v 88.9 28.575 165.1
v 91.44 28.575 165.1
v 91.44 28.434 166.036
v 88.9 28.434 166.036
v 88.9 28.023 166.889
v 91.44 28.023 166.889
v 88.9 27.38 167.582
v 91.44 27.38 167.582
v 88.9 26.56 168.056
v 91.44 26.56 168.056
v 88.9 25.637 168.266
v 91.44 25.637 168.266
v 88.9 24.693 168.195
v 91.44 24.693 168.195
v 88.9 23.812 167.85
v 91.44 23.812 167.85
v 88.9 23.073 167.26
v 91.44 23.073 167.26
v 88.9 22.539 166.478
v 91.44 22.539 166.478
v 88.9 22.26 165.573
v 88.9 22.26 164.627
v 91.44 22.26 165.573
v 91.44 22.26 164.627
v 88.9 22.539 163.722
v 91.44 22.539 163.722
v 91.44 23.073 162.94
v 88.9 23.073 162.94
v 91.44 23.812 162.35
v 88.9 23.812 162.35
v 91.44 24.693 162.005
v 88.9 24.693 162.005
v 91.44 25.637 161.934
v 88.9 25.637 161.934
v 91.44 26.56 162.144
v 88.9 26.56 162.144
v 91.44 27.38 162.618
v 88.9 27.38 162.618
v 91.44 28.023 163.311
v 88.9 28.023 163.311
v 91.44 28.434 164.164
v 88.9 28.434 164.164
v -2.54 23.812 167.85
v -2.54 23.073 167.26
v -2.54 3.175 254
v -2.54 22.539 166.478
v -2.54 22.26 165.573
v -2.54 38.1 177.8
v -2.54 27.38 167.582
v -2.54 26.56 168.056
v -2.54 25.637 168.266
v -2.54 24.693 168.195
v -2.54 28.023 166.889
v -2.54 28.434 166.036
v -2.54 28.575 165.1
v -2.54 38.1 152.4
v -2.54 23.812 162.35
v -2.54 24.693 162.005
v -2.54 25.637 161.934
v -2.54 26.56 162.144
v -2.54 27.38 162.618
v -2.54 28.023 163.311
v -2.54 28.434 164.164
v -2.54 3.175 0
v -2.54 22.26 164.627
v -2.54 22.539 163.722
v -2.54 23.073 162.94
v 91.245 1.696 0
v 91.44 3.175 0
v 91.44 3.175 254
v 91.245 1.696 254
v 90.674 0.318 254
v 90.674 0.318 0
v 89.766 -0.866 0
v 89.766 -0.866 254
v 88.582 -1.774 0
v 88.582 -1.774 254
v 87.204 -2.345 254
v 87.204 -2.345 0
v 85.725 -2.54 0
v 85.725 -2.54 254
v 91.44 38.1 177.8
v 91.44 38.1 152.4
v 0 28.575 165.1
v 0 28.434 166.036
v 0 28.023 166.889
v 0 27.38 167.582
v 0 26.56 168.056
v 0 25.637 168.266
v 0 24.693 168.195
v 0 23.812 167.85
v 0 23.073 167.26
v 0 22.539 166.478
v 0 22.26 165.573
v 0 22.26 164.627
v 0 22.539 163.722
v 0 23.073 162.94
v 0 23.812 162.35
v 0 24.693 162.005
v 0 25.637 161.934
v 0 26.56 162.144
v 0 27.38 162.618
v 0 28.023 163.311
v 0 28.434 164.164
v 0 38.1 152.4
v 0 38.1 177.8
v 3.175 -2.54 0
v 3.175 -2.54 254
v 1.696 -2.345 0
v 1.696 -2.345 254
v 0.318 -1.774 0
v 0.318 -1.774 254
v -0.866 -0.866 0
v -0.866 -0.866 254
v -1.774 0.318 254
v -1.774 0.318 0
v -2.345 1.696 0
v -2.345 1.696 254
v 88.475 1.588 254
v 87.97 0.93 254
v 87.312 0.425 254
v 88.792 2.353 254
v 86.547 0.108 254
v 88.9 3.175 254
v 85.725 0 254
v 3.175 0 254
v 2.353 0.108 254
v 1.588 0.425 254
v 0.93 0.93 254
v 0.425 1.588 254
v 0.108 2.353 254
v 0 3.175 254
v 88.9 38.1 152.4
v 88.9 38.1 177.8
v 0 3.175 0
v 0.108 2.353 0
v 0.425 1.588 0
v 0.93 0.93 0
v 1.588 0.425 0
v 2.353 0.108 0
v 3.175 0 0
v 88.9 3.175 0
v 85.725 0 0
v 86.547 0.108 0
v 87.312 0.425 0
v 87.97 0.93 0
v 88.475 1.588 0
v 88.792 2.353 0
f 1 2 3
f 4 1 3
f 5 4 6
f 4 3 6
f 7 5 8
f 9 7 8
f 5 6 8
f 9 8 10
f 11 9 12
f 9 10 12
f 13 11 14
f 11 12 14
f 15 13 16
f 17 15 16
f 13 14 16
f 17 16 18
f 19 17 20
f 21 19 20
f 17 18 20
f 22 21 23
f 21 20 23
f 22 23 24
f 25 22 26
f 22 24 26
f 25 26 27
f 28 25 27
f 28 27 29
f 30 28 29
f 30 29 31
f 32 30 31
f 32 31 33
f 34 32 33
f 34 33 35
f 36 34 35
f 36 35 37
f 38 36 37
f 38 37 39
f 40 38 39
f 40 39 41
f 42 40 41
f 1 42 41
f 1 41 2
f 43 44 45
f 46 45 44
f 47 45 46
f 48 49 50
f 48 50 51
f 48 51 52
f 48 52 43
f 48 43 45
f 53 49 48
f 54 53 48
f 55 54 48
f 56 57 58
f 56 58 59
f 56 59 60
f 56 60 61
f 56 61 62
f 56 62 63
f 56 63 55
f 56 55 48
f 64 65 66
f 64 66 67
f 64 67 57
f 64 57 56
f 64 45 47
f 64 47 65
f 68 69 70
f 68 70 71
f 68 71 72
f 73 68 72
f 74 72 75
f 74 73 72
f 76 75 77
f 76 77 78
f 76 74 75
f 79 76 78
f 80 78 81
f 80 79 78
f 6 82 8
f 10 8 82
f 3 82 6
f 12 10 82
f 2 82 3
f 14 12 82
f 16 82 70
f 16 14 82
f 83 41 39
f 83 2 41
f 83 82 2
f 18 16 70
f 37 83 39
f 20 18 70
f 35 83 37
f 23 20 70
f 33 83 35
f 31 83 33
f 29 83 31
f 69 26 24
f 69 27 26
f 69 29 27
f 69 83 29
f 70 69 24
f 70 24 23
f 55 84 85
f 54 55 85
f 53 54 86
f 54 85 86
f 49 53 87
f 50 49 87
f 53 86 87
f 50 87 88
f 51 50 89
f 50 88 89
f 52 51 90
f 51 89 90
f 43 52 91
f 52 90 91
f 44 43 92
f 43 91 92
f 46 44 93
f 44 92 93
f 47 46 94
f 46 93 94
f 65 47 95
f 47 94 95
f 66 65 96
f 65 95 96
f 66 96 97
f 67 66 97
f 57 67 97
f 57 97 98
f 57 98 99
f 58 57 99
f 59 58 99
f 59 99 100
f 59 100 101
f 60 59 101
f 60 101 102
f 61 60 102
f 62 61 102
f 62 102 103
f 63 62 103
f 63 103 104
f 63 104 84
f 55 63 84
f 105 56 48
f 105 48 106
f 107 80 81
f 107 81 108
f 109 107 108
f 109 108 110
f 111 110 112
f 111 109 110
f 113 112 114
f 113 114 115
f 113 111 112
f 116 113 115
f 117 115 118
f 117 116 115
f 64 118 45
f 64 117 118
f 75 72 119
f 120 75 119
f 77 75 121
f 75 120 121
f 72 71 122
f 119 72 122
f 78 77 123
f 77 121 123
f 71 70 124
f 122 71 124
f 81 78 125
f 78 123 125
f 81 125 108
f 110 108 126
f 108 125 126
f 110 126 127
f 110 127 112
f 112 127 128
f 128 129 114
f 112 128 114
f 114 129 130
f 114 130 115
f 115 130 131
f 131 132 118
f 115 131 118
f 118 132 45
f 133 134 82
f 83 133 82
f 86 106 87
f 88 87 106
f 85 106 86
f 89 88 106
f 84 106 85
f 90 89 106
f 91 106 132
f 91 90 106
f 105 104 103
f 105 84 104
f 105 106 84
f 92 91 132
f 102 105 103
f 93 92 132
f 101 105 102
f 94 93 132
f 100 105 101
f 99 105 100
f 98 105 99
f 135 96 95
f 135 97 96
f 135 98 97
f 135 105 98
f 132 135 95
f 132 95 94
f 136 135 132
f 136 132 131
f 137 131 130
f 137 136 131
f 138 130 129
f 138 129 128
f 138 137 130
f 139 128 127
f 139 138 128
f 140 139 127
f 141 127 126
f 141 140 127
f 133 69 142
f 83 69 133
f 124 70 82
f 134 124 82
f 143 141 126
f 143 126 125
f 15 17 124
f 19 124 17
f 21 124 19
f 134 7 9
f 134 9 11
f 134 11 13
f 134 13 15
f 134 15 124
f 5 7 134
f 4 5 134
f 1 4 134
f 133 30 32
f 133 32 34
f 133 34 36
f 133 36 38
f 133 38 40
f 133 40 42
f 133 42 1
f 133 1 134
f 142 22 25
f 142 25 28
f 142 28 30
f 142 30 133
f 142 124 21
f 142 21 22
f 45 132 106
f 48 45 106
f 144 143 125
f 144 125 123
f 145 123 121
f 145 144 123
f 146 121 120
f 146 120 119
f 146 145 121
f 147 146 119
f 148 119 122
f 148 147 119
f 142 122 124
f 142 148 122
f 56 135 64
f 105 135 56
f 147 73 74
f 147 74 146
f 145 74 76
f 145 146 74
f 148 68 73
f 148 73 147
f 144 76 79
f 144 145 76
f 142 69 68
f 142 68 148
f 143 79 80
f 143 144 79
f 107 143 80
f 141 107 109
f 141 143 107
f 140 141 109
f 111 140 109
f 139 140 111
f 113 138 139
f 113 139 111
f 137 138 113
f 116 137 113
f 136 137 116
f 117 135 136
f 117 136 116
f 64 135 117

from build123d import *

# Parameters (mm, degrees)
BASE_FLANGE1_DEPTH = 254
SKETCH7_R          = 3.175
CUT_EXTRUDE1_DEPTH = 274.495613128


# Sheet-metal steps are written as plain solids
with BuildPart() as part:
    # Sketch2 → Base-Flange1 (new body)
    with BuildSketch(Plane.XY):
        with BuildLine():
            Line((0, 38.1), (0, 3.175))
            ThreePointArc((0, 3.175), (0.92993597, 0.92993597), (3.175, 0))
            Line((3.175, 0), (85.725, 0))
            ThreePointArc((85.725, 0), (87.97006403, 0.92993597), (88.9, 3.175))
            Line((88.9, 3.175), (88.9, 38.1))
            Line((88.9, 38.1), (91.44, 38.1))
            Line((91.44, 38.1), (91.44, 3.175))
            ThreePointArc((91.44, 3.175), (89.766115254, -0.866115254), (85.725, -2.54))
            Line((85.725, -2.54), (3.175, -2.54))
            ThreePointArc((3.175, -2.54), (-0.866115254, -0.866115254), (-2.54, 3.175))
            Line((-2.54, 3.175), (-2.54, 38.1))
            Line((-2.54, 38.1), (0, 38.1))
        make_face()
    extrude(amount=BASE_FLANGE1_DEPTH)

    # Sketch7 → Cut-Extrude1 (cut, through all)
    with BuildSketch(Plane(origin=(91.44, 0, 0), x_dir=(0, 0, -1), z_dir=(1, 0, 0))):
        with Locations(Location((-165.1, 25.4, 0), (0, 0, 90))):
            Circle(SKETCH7_R)
        Polygon((-254, 38.1), (-254, 3.175), (-177.8, 38.1), align=None)
        Polygon((0, 38.1), (0, 3.175), (-152.4, 38.1), align=None)
    extrude(amount=-CUT_EXTRUDE1_DEPTH, mode=Mode.SUBTRACT)


solid = part.part
